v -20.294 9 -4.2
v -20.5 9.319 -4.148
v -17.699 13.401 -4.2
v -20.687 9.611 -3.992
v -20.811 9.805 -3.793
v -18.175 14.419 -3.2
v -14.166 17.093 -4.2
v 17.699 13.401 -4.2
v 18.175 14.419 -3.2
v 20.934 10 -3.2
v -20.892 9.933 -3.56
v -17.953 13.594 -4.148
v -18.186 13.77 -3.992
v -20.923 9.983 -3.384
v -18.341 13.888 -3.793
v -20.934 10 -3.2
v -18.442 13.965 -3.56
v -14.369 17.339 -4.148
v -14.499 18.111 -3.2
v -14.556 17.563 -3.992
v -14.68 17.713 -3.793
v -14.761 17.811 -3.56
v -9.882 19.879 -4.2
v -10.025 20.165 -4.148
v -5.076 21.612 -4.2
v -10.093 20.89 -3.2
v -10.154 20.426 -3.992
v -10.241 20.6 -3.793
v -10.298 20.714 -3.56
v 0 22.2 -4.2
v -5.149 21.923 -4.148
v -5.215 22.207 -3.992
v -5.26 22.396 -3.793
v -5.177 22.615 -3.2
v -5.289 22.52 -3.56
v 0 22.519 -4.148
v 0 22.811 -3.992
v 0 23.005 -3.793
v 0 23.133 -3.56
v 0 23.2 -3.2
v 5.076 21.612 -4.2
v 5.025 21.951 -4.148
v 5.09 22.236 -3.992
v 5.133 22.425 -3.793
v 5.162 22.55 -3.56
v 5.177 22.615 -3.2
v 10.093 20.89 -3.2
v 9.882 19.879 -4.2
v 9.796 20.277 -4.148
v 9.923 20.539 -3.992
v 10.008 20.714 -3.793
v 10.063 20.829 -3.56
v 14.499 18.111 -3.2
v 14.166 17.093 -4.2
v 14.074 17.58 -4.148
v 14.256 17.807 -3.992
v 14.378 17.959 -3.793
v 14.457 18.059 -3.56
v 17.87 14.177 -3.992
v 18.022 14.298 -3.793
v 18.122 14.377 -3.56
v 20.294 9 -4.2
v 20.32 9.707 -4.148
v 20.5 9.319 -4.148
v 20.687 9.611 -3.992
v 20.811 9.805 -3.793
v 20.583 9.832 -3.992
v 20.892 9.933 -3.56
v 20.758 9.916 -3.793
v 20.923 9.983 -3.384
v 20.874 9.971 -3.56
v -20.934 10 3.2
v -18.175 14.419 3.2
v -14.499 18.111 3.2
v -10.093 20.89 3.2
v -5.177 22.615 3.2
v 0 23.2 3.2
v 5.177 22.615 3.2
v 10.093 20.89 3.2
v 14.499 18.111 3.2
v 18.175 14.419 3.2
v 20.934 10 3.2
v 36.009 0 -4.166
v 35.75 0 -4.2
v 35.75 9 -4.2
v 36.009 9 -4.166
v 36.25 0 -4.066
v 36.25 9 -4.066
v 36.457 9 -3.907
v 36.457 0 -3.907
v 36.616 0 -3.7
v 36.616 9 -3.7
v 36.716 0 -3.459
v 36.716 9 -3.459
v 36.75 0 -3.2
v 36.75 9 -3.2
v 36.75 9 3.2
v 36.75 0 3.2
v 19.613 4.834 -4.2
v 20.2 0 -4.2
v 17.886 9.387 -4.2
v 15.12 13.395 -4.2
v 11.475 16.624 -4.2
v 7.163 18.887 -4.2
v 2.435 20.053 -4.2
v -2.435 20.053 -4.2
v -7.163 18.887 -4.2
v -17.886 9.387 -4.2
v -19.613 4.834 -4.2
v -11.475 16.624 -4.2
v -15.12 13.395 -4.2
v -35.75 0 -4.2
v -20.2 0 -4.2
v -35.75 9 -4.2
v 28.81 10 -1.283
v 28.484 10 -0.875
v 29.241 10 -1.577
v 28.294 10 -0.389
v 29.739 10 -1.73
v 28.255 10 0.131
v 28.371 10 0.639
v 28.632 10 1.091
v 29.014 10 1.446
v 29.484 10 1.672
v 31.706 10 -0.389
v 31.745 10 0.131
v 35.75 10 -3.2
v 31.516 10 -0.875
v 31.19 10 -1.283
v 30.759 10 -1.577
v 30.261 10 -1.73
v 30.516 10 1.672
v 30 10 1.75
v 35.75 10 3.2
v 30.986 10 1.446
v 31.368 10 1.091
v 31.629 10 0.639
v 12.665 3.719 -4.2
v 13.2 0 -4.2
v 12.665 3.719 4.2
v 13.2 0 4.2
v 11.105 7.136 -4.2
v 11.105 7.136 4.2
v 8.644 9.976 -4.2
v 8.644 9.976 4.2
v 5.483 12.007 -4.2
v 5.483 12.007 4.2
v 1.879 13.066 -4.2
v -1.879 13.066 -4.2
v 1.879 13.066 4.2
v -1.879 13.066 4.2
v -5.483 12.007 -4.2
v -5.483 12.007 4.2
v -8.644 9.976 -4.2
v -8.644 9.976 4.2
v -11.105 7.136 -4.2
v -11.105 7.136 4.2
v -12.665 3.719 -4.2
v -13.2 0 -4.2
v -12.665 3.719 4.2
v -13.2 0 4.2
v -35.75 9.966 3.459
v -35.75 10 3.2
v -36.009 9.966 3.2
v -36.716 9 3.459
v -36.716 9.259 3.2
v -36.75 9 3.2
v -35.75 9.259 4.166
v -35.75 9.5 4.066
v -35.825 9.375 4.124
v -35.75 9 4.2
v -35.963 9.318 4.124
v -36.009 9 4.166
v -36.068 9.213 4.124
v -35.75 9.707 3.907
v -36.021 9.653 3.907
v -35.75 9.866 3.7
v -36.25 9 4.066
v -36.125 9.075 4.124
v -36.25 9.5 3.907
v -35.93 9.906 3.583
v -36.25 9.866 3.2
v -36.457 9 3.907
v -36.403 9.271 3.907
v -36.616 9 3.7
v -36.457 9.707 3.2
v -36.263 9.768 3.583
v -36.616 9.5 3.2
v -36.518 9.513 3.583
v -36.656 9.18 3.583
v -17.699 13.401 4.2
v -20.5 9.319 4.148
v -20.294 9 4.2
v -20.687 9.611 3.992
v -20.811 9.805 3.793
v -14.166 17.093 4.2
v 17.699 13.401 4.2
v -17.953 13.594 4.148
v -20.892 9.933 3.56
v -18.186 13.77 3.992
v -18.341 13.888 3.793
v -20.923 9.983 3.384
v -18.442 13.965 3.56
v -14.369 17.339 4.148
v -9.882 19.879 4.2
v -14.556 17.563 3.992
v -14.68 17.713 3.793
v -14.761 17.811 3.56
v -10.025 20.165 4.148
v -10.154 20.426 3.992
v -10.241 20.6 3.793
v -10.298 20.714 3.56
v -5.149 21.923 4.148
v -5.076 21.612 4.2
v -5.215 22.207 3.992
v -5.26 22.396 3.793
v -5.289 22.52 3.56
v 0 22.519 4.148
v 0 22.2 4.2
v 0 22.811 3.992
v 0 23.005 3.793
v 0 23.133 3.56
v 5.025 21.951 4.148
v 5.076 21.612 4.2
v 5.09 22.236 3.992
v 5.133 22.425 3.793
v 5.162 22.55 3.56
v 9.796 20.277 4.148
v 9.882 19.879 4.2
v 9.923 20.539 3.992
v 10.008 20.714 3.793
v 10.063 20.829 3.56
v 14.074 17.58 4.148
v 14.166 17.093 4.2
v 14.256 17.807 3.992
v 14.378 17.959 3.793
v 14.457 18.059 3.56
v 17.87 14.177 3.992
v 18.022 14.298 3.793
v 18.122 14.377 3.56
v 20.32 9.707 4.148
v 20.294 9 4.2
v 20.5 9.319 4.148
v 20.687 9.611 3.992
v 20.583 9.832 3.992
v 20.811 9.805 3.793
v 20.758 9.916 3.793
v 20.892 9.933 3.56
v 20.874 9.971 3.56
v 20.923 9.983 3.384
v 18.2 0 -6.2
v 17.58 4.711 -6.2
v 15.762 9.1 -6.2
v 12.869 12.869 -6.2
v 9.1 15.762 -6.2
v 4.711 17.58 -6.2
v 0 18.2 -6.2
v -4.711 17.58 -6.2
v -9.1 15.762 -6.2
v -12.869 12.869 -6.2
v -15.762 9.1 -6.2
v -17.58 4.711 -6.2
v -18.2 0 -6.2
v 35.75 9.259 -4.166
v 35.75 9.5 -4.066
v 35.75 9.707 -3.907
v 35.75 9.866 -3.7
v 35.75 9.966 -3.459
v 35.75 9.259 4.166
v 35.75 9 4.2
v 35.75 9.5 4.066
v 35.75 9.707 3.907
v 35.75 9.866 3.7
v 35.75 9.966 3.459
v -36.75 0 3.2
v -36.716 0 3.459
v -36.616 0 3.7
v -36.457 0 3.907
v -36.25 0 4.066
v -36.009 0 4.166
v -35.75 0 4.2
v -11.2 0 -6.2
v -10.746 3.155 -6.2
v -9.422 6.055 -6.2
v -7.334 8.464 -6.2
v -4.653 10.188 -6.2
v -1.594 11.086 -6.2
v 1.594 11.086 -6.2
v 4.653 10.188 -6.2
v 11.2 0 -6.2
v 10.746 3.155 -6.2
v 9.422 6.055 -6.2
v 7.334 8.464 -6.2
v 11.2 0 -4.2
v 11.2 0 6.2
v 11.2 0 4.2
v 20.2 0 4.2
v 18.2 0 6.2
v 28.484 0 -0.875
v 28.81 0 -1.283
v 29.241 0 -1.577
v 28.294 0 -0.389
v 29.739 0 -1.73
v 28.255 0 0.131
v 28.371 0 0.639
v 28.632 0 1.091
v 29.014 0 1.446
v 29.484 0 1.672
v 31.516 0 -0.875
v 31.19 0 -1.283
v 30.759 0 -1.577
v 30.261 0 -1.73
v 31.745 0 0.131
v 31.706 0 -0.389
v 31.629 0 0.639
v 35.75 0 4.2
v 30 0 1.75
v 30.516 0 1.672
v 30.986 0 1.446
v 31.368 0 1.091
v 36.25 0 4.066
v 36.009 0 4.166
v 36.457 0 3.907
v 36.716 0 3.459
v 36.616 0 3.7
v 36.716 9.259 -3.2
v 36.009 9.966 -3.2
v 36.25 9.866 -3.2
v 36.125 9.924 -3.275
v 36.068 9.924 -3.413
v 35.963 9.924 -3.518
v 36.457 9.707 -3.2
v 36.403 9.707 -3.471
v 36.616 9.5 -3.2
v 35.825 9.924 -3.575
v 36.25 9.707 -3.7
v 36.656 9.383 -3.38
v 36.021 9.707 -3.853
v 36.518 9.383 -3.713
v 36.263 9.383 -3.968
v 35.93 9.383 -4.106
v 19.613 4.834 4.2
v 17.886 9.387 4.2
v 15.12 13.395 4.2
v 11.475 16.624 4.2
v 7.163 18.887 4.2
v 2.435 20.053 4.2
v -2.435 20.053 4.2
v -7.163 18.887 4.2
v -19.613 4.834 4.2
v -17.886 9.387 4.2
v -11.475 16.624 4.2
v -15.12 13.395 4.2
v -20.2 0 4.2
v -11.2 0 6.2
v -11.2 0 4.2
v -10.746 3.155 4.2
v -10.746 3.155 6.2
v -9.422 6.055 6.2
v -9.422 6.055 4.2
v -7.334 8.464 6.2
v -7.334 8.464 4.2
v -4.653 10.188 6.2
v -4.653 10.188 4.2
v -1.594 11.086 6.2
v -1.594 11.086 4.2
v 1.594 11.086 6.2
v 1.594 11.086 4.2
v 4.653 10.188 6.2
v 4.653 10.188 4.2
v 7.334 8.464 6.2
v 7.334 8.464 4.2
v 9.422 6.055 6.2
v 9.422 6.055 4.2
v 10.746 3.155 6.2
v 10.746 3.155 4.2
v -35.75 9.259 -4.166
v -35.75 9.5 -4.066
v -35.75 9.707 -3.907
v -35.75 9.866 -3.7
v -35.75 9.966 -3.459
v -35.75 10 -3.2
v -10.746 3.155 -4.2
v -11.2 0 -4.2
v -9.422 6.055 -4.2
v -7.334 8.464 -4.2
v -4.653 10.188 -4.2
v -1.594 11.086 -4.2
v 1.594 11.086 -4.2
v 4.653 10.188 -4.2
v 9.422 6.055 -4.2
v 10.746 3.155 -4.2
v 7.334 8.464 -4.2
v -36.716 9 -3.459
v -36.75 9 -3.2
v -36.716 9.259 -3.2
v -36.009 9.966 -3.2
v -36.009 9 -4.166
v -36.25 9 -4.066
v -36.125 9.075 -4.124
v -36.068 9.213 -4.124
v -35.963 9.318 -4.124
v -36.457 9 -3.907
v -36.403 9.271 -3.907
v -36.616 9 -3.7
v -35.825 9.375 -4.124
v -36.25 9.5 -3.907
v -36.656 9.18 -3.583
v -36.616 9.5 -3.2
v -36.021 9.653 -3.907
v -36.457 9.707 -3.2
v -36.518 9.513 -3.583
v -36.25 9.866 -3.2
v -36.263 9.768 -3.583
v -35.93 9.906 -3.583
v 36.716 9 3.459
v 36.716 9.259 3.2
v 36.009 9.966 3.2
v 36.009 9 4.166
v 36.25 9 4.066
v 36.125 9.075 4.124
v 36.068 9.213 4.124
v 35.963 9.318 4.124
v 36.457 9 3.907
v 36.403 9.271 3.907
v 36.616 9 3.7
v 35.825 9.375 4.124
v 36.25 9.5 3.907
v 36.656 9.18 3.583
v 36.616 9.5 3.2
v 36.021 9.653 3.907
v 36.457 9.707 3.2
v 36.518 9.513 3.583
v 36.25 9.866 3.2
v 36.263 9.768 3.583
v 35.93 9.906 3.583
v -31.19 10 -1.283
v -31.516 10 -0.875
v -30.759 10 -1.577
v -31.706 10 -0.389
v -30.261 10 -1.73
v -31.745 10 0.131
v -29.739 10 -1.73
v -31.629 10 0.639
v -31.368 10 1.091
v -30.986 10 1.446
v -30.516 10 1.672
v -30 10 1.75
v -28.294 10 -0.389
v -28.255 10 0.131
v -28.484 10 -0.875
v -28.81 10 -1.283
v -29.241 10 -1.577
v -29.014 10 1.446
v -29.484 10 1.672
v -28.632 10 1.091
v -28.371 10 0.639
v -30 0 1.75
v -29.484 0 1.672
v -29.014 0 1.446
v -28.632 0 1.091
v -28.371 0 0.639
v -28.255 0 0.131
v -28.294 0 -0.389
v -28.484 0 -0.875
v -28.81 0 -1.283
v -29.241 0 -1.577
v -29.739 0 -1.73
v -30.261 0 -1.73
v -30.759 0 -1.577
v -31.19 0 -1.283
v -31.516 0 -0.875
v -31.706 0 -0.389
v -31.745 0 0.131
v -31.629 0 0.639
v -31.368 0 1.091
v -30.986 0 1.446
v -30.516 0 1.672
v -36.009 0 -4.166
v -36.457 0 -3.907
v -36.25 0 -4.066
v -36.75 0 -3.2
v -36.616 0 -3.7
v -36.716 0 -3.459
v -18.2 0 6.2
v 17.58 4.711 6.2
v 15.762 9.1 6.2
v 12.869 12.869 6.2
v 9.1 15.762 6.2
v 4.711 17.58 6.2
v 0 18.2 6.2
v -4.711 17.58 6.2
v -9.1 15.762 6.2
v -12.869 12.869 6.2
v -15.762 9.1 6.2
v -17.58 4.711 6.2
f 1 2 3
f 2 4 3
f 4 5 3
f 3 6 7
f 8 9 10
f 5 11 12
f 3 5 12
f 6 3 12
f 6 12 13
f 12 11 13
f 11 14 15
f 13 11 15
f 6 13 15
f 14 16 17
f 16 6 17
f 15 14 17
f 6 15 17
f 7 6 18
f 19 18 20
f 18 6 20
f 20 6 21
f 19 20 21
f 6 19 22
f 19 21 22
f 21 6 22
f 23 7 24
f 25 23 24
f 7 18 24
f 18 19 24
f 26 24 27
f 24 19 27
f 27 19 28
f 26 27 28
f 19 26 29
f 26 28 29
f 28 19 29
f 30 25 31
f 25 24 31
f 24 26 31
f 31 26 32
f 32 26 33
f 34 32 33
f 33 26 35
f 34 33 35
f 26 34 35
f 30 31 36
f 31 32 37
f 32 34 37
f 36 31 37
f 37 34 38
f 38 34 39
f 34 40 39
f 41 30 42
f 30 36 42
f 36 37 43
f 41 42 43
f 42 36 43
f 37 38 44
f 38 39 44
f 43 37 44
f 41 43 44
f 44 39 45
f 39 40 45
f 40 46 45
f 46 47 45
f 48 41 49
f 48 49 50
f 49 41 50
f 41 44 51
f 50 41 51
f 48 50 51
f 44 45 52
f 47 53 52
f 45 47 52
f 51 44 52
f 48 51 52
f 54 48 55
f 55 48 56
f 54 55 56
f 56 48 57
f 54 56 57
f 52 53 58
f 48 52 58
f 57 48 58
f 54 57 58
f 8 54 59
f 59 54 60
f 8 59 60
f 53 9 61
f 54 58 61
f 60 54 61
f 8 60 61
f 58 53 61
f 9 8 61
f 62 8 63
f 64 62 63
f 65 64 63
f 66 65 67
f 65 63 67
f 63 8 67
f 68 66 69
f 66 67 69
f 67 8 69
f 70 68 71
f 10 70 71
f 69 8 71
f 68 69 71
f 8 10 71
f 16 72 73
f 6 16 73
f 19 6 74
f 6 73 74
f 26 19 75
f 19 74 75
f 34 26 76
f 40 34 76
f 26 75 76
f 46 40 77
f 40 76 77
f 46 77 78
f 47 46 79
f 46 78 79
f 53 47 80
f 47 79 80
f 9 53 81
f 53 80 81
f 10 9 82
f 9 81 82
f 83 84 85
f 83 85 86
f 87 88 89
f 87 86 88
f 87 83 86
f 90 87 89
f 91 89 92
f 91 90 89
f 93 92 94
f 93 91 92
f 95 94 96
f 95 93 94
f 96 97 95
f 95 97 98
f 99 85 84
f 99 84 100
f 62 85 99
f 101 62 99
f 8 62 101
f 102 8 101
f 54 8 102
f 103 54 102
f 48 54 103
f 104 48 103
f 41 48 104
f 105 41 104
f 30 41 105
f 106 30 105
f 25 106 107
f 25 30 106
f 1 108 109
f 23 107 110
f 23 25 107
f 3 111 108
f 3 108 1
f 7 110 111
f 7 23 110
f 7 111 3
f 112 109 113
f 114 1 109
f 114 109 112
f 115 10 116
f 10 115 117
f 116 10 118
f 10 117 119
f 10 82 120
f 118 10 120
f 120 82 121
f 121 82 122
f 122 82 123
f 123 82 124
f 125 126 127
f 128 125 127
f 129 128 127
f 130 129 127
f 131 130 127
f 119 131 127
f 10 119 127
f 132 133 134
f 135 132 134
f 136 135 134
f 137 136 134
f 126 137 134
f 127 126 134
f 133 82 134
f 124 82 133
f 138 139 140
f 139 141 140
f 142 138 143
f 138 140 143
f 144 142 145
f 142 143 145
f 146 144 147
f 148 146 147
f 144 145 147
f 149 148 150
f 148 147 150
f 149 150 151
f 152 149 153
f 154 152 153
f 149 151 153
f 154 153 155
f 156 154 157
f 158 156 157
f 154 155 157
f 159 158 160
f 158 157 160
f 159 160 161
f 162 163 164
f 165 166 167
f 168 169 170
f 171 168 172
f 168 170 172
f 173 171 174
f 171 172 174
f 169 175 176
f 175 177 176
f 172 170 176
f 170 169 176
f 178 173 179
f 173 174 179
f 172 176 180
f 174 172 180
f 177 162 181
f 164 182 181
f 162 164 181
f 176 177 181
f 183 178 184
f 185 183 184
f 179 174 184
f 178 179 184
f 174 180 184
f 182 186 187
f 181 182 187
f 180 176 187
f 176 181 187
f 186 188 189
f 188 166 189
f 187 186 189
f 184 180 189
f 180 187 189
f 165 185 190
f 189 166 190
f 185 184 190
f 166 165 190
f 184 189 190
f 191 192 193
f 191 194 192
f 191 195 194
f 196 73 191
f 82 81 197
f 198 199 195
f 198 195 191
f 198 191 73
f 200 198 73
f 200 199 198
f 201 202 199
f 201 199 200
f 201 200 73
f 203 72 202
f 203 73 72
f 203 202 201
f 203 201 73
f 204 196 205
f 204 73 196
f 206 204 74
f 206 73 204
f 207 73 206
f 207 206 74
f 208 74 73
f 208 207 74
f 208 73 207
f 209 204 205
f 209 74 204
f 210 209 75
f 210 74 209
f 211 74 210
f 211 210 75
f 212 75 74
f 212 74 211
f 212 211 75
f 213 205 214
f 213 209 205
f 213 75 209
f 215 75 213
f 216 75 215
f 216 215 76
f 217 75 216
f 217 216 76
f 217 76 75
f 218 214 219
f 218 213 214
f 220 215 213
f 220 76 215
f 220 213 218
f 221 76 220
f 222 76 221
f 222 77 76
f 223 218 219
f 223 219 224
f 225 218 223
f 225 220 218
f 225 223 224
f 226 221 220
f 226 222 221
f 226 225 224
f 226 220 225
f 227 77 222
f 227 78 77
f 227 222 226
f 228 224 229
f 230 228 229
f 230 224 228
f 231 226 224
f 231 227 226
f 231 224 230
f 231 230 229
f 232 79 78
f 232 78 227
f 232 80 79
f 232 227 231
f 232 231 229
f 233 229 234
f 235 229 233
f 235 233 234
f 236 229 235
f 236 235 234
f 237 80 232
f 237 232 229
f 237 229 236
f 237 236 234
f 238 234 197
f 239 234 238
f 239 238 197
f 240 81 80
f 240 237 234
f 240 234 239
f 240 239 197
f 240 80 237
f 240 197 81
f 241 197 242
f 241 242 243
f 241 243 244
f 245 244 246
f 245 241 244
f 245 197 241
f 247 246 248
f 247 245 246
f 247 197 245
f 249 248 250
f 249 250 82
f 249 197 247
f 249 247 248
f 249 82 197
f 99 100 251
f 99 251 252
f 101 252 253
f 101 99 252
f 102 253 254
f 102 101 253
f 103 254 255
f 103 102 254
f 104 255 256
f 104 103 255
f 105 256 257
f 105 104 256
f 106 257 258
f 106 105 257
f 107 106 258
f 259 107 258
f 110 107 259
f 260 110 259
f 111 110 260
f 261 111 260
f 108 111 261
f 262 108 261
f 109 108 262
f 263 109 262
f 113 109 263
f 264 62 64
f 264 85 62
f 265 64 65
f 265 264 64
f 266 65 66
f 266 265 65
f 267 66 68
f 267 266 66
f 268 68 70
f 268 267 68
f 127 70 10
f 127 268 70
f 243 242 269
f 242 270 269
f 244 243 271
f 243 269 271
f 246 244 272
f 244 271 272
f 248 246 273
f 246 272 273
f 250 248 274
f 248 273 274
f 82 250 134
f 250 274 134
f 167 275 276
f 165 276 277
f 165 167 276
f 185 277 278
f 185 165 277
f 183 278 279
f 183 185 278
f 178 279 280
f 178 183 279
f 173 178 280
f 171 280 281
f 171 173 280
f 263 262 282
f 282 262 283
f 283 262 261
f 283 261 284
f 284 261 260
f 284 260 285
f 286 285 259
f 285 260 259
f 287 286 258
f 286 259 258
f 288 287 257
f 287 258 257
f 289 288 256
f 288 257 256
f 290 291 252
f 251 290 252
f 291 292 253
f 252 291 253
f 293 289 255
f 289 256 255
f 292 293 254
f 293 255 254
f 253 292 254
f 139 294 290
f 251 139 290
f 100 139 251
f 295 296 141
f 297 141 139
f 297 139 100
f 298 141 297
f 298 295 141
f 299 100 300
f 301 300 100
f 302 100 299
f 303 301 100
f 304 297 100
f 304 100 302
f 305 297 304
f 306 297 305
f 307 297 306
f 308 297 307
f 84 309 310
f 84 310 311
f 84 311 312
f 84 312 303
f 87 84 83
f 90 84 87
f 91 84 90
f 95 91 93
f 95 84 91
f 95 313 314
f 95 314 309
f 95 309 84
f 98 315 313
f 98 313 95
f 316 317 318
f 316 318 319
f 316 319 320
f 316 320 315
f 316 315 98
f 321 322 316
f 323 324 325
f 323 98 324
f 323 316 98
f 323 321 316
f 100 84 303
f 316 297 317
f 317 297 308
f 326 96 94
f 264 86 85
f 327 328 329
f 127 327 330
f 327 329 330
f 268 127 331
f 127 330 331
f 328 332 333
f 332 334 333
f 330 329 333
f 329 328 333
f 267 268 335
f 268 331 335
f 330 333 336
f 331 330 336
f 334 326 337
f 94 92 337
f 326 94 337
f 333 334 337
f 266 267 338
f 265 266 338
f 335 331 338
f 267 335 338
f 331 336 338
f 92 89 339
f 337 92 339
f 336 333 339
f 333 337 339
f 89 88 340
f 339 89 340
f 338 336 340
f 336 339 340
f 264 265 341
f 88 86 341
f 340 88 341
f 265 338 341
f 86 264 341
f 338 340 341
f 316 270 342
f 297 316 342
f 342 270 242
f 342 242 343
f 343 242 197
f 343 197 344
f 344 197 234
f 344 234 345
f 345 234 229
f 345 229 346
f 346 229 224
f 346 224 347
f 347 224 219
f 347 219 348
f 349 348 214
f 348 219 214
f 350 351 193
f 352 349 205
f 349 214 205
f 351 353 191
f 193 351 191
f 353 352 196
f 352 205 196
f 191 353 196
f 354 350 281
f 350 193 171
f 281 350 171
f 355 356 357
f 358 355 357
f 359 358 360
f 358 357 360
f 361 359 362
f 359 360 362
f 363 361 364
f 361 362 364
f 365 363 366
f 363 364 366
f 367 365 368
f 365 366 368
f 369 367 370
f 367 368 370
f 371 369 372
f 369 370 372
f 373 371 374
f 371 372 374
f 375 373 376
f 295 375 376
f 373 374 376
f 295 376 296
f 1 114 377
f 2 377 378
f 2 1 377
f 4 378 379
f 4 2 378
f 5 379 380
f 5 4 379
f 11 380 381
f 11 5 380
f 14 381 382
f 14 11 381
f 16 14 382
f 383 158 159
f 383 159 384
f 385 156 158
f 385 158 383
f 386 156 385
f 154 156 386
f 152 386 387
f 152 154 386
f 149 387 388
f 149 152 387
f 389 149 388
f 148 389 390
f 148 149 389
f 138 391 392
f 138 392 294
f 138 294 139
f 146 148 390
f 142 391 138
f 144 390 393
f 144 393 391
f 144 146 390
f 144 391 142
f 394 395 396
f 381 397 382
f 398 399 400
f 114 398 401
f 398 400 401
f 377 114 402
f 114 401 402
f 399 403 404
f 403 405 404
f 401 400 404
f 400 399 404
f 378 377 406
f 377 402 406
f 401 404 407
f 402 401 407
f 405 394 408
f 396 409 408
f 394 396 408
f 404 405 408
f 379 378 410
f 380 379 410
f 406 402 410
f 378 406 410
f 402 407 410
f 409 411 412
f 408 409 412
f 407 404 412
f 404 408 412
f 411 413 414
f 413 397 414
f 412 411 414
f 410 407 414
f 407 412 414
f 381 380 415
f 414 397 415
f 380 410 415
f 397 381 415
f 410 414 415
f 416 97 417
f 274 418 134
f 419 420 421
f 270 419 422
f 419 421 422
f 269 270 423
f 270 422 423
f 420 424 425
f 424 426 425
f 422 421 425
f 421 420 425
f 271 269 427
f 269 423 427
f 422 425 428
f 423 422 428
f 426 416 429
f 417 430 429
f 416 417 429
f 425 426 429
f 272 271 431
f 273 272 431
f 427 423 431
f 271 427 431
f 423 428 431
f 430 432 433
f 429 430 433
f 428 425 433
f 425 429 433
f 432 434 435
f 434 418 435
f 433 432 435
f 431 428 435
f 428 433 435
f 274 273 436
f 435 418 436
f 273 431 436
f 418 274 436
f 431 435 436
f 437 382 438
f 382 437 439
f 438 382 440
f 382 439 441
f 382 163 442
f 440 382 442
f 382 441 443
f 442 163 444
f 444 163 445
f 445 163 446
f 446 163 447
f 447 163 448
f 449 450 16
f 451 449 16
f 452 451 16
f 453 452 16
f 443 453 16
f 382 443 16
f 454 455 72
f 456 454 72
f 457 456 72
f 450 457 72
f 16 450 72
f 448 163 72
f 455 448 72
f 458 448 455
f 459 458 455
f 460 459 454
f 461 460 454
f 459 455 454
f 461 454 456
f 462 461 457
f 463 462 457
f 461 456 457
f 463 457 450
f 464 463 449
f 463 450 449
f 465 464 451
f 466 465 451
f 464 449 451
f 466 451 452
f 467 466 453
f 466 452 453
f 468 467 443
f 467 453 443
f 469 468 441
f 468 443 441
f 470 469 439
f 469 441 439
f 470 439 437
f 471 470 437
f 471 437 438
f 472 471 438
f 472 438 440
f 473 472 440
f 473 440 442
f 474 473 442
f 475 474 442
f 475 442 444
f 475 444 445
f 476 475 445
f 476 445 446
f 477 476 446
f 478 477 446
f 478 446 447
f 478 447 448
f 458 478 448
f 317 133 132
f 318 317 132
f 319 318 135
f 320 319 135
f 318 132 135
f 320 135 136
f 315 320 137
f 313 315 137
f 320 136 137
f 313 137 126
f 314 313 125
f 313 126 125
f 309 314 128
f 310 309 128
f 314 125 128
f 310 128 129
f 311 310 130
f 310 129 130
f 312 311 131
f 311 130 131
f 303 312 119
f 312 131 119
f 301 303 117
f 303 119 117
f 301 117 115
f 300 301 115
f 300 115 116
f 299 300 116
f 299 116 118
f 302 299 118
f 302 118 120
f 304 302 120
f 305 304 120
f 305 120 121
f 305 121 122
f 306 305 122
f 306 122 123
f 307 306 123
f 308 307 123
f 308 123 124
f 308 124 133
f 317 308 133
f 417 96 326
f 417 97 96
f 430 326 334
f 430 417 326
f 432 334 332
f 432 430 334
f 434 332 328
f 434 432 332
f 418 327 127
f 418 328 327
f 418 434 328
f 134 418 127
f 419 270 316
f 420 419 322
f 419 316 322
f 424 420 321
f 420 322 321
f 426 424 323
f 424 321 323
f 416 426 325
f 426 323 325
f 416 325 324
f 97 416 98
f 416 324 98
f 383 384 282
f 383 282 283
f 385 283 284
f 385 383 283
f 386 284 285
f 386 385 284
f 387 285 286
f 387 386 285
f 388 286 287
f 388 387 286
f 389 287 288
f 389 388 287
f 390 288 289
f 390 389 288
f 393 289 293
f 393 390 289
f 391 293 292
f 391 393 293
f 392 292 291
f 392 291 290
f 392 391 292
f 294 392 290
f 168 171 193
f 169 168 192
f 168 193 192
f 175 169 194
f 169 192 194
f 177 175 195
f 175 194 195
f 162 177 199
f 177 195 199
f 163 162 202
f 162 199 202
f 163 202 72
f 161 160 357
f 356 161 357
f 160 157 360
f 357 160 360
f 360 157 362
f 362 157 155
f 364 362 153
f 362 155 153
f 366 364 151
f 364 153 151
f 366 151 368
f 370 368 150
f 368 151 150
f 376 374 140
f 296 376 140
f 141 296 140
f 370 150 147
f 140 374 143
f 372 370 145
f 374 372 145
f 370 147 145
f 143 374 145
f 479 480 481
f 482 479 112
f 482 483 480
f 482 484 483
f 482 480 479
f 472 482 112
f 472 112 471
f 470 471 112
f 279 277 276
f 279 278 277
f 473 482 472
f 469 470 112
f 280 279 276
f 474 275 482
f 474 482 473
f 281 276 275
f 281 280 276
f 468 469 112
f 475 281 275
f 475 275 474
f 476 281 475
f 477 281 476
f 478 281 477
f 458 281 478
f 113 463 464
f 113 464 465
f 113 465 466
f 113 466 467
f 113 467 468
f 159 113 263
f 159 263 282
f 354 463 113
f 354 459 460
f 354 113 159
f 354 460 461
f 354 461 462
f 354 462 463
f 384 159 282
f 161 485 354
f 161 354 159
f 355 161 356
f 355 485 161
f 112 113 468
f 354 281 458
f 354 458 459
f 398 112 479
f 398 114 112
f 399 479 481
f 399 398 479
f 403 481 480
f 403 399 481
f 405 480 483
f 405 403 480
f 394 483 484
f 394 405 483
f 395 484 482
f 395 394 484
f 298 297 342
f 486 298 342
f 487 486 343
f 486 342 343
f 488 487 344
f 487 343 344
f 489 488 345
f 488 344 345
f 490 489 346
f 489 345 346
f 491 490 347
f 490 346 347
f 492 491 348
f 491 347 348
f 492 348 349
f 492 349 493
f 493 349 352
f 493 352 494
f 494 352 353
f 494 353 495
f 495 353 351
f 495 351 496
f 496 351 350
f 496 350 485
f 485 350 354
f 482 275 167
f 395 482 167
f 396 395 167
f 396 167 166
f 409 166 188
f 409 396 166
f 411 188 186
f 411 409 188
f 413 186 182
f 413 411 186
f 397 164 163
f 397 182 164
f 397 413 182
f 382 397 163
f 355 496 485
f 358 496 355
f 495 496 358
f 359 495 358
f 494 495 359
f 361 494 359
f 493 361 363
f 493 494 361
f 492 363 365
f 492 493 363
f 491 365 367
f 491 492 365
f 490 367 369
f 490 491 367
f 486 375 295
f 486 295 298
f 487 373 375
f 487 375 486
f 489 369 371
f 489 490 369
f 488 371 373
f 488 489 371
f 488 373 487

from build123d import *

# Parameters (mm, degrees)
BOSS_EXTRUDE1_DEPTH = 4.2
BOSS_EXTRUDE2_DEPTH = 2
CHAMFER1_SIZE       = 2
SKETCH3_R           = 1.75
CUT_EXTRUDE1_DEPTH  = 40.537861601
FILLET1_R           = 1


with BuildPart() as part:
    # Sketch1 → Boss-Extrude1 (new, symmetric)
    with BuildSketch(Plane.XY):
        with BuildLine():
            Line((36.75, 0), (13.2, 0))
            ThreePointArc((13.2, 0), (0, 13.2), (-13.2, 0))
            Line((-13.2, 0), (-36.75, 0))
            Line((-36.75, 0), (-36.75, 10))
            Line((-36.75, 10), (-20.934182573, 10))
            ThreePointArc((-20.934182573, 10), (0, 23.2), (20.934182573, 10))
            Line((20.934182573, 10), (36.75, 10))
            Line((36.75, 10), (36.75, 0))
        make_face()
    extrude(amount=BOSS_EXTRUDE1_DEPTH, both=True)

    # Sketch2 → Boss-Extrude2 (add)
    with BuildSketch(Plane.XY.offset(4.2)):
        with BuildLine():
            Line((-18.2, 0), (-11.2, 0))
            ThreePointArc((-11.2, 0), (0, 11.2), (11.2, 0))
            Line((11.2, 0), (18.2, 0))
            ThreePointArc((18.2, 0), (0, 18.2), (-18.2, 0))
        make_face()
    boss_extrude2 = extrude(amount=BOSS_EXTRUDE2_DEPTH)

    # Mirror1: Boss-Extrude2 across plane
    add(boss_extrude2.mirror(Plane.XY))

    # Chamfer1
    chamfer1_edges = [part.edges().sort_by_distance(p)[0] for p in [
        (0, 18.2, -4.2),
        (0, 18.2, 4.2),
    ]]
    chamfer(chamfer1_edges, length=CHAMFER1_SIZE - 0.0001)  # a hair under: the kernel refuses the full size

    # Sketch3 → Cut-Extrude1 (cut, through all)
    with BuildSketch(Plane(origin=(0, 10, 0), x_dir=(1, 0, 0), z_dir=(0, 1, 0))):
        with Locations(Location((-30, 0, 0), (0, 0, 270))):
            Circle(SKETCH3_R)
        with Locations(Location((30, 0, 0), (0, 0, 270))):
            Circle(SKETCH3_R)
    extrude(amount=-CUT_EXTRUDE1_DEPTH, mode=Mode.SUBTRACT)

    # Fillet1
    fillet1_edges = [part.edges().sort_by_distance(p)[0] for p in [
        (36.75, 5, -4.2),
        (-36.75, 10, 0),
        (36.75, 10, 0),
        (36.75, 5, 4.2),
        (28.842091287, 10, 4.2),
        (0, 23.2, 4.2),
        (-28.842091287, 10, 4.2),
        (-36.75, 5, 4.2),
        (-36.75, 5, -4.2),
        (-28.842091287, 10, -4.2),
        (0, 23.2, -4.2),
        (28.842091287, 10, -4.2),
    ]]
    fillet(fillet1_edges, radius=FILLET1_R)


solid = part.part
